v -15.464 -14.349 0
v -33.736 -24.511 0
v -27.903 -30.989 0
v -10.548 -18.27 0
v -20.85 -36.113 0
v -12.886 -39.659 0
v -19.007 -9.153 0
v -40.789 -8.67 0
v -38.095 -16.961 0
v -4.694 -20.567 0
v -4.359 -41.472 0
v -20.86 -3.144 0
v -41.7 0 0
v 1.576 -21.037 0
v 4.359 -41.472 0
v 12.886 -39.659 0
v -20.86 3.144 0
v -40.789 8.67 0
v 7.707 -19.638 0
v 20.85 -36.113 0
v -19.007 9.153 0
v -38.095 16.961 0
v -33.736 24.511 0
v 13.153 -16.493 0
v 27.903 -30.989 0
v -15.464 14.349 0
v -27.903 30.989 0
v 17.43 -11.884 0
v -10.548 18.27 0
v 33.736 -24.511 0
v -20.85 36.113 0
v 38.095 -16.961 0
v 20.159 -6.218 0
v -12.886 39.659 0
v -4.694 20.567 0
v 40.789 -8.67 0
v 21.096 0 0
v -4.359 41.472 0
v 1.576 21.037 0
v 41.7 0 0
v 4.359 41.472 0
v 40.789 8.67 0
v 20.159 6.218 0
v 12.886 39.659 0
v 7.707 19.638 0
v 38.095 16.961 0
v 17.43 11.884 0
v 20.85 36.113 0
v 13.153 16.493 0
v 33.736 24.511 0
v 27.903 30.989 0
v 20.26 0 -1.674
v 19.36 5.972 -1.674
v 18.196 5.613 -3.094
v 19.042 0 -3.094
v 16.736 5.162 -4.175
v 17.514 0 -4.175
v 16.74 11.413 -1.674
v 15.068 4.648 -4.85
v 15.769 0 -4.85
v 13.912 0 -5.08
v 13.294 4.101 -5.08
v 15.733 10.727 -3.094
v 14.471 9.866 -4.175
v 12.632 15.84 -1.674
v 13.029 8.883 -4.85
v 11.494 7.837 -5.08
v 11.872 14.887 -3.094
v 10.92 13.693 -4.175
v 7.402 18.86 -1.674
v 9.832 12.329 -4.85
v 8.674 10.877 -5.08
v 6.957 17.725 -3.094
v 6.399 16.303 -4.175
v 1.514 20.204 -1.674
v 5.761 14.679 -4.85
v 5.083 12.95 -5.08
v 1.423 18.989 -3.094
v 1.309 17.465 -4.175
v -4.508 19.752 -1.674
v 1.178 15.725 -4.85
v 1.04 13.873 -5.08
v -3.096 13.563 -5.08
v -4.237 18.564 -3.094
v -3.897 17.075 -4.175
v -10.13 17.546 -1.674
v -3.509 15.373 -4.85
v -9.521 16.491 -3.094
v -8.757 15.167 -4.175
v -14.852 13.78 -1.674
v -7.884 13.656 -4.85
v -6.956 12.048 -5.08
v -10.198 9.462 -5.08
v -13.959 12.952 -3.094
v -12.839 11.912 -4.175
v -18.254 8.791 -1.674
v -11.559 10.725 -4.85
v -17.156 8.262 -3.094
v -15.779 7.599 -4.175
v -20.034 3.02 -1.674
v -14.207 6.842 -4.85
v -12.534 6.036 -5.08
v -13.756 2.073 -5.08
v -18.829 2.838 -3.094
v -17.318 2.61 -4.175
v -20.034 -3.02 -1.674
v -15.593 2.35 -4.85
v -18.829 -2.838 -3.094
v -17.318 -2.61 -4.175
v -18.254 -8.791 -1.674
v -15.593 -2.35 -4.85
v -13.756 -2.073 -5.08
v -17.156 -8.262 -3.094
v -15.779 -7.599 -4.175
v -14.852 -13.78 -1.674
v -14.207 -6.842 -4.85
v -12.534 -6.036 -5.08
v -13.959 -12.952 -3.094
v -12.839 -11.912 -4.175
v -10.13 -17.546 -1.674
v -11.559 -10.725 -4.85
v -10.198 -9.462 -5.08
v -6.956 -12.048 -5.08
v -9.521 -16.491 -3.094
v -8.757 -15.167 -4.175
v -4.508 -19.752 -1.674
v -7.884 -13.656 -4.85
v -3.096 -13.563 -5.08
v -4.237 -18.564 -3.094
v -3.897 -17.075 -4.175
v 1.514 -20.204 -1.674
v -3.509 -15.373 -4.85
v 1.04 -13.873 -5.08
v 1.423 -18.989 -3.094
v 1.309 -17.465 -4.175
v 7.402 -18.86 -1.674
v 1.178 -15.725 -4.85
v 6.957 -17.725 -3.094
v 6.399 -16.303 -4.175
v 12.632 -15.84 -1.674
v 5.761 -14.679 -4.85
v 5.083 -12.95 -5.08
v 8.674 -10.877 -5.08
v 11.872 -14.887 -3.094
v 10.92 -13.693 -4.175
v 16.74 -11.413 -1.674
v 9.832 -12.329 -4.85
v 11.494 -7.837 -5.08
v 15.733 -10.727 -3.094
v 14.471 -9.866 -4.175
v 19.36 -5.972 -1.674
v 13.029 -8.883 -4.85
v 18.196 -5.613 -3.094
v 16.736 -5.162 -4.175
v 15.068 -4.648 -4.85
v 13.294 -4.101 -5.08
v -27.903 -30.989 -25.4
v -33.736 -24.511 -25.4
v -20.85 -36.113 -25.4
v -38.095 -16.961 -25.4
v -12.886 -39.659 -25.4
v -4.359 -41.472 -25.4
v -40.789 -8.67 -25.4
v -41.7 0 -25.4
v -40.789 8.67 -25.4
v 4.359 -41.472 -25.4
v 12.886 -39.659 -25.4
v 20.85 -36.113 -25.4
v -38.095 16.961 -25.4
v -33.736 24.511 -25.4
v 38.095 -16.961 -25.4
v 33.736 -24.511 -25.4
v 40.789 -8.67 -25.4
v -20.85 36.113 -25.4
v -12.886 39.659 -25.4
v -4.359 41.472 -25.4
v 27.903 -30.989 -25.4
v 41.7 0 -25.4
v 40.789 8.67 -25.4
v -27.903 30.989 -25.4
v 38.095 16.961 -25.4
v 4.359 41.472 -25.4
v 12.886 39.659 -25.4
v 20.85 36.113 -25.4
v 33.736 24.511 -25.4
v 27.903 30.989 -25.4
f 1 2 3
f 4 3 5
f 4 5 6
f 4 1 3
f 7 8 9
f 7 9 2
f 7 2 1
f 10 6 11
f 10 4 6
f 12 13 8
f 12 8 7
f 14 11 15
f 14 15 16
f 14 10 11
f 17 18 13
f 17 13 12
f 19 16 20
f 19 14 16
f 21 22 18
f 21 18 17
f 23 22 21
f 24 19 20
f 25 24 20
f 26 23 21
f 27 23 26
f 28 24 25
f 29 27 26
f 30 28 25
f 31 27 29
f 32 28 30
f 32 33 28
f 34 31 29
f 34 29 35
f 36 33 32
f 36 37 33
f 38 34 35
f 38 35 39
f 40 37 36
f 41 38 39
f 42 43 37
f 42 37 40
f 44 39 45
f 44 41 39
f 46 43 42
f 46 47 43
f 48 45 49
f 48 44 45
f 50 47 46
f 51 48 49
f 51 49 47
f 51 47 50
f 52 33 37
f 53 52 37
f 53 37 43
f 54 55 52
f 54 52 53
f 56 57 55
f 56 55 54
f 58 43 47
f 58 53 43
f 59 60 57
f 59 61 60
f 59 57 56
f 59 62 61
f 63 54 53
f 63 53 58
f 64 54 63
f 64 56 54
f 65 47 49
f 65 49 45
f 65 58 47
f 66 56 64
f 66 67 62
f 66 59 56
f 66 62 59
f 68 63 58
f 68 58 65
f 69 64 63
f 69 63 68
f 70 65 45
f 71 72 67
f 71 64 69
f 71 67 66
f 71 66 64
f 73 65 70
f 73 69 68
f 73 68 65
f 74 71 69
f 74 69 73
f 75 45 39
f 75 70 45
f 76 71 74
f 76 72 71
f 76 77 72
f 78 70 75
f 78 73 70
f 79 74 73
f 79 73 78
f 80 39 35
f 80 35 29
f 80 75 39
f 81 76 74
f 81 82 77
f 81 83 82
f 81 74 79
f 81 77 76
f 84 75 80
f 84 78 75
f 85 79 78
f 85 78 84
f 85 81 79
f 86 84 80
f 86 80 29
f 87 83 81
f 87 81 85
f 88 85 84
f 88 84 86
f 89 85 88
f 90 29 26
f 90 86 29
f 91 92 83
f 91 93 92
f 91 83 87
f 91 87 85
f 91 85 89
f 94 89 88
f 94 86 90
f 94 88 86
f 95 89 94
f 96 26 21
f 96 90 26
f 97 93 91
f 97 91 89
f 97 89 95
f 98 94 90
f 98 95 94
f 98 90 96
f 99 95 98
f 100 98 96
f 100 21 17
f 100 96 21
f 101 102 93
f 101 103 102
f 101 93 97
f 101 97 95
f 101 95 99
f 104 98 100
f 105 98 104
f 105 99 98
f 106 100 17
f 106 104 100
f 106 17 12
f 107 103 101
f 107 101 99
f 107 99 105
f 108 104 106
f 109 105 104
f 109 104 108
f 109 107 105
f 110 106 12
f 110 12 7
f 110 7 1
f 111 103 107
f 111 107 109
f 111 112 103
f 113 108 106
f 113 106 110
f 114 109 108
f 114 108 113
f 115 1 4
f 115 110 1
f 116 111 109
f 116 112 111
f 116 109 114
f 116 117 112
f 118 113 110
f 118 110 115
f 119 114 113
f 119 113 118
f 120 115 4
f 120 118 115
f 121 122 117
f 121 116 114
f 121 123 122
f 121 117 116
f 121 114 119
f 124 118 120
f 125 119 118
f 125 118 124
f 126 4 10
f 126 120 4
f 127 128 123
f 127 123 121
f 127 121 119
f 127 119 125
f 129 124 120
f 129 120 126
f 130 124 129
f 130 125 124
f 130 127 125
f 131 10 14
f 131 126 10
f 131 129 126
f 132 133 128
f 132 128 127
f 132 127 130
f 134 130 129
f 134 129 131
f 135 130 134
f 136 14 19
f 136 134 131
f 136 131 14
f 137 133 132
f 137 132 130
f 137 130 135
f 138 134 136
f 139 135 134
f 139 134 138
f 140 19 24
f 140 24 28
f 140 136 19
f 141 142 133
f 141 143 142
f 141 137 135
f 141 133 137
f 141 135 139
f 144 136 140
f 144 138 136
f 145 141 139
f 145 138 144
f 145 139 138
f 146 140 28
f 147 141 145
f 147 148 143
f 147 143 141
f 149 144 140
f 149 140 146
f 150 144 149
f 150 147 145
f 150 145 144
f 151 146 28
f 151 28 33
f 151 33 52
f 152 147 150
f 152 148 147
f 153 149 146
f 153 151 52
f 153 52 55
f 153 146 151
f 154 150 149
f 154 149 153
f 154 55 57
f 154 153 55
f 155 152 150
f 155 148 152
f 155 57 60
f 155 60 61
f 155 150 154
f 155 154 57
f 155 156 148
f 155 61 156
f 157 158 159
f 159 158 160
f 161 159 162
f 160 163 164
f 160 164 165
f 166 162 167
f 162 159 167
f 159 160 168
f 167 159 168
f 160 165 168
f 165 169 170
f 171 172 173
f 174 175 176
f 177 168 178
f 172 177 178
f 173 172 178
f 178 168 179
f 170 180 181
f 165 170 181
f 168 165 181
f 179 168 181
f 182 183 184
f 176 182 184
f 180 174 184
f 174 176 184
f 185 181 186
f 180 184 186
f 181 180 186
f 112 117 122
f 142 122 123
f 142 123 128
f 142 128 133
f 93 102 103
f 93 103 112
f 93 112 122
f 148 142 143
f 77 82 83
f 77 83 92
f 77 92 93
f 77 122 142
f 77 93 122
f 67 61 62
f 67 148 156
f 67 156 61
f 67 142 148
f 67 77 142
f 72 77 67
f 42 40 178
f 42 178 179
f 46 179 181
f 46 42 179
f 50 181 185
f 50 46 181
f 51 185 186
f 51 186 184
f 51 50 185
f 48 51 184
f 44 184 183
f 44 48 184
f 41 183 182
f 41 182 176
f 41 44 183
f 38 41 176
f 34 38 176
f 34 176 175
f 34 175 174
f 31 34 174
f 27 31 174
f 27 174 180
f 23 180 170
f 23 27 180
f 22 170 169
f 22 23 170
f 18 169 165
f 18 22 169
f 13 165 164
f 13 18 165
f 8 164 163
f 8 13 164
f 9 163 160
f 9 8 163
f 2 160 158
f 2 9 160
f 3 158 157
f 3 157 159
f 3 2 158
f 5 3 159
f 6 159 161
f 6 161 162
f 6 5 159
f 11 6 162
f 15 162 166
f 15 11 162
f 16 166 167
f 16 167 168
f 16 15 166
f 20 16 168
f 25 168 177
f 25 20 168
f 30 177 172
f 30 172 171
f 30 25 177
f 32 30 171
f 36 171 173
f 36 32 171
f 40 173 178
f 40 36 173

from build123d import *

# Parameters (mm, degrees)
F0_R     = 41.7000635609
F1_DEPTH = 25.4
F2_R     = 21.0958969827
F3_DEPTH = 5.08


# Not quite as in the source:
# - a fillet or chamfer that OpenCascade refuses, or shapes differently, is made with other operations: its cross-section is extruded or revolved along the edge and cut away or added


with BuildPart() as f1:
    # F0 (on Top) → F1 (new body)
    with BuildSketch(Plane.XY):
        Circle(F0_R)
    extrude(amount=-F1_DEPTH)

    # F2 (on face) → F3 (cut)
    with BuildSketch(Plane.XY):
        Circle(F2_R)
    extrude(amount=-F3_DEPTH, mode=Mode.SUBTRACT)

    # F4: fillet of radius 7.62 on 1 edges, made by hand

    # F4_s1 → F4_t2 (revolve)
    with BuildSketch(Plane.XZ):
        with BuildLine():
            ThreePointArc((21.0958969827, 0), (18.3111011371, -3.6817039467), (13.9116920859, -5.08))
            Line((13.9116920859, -5.08), (21.0958969827, -5.08))
            Line((21.0958969827, -5.08), (21.0958969827, 0))
        make_face()
    revolve(axis=Axis((0, 0, -5.08), (0, 0, 1)))


solid = f1.part
